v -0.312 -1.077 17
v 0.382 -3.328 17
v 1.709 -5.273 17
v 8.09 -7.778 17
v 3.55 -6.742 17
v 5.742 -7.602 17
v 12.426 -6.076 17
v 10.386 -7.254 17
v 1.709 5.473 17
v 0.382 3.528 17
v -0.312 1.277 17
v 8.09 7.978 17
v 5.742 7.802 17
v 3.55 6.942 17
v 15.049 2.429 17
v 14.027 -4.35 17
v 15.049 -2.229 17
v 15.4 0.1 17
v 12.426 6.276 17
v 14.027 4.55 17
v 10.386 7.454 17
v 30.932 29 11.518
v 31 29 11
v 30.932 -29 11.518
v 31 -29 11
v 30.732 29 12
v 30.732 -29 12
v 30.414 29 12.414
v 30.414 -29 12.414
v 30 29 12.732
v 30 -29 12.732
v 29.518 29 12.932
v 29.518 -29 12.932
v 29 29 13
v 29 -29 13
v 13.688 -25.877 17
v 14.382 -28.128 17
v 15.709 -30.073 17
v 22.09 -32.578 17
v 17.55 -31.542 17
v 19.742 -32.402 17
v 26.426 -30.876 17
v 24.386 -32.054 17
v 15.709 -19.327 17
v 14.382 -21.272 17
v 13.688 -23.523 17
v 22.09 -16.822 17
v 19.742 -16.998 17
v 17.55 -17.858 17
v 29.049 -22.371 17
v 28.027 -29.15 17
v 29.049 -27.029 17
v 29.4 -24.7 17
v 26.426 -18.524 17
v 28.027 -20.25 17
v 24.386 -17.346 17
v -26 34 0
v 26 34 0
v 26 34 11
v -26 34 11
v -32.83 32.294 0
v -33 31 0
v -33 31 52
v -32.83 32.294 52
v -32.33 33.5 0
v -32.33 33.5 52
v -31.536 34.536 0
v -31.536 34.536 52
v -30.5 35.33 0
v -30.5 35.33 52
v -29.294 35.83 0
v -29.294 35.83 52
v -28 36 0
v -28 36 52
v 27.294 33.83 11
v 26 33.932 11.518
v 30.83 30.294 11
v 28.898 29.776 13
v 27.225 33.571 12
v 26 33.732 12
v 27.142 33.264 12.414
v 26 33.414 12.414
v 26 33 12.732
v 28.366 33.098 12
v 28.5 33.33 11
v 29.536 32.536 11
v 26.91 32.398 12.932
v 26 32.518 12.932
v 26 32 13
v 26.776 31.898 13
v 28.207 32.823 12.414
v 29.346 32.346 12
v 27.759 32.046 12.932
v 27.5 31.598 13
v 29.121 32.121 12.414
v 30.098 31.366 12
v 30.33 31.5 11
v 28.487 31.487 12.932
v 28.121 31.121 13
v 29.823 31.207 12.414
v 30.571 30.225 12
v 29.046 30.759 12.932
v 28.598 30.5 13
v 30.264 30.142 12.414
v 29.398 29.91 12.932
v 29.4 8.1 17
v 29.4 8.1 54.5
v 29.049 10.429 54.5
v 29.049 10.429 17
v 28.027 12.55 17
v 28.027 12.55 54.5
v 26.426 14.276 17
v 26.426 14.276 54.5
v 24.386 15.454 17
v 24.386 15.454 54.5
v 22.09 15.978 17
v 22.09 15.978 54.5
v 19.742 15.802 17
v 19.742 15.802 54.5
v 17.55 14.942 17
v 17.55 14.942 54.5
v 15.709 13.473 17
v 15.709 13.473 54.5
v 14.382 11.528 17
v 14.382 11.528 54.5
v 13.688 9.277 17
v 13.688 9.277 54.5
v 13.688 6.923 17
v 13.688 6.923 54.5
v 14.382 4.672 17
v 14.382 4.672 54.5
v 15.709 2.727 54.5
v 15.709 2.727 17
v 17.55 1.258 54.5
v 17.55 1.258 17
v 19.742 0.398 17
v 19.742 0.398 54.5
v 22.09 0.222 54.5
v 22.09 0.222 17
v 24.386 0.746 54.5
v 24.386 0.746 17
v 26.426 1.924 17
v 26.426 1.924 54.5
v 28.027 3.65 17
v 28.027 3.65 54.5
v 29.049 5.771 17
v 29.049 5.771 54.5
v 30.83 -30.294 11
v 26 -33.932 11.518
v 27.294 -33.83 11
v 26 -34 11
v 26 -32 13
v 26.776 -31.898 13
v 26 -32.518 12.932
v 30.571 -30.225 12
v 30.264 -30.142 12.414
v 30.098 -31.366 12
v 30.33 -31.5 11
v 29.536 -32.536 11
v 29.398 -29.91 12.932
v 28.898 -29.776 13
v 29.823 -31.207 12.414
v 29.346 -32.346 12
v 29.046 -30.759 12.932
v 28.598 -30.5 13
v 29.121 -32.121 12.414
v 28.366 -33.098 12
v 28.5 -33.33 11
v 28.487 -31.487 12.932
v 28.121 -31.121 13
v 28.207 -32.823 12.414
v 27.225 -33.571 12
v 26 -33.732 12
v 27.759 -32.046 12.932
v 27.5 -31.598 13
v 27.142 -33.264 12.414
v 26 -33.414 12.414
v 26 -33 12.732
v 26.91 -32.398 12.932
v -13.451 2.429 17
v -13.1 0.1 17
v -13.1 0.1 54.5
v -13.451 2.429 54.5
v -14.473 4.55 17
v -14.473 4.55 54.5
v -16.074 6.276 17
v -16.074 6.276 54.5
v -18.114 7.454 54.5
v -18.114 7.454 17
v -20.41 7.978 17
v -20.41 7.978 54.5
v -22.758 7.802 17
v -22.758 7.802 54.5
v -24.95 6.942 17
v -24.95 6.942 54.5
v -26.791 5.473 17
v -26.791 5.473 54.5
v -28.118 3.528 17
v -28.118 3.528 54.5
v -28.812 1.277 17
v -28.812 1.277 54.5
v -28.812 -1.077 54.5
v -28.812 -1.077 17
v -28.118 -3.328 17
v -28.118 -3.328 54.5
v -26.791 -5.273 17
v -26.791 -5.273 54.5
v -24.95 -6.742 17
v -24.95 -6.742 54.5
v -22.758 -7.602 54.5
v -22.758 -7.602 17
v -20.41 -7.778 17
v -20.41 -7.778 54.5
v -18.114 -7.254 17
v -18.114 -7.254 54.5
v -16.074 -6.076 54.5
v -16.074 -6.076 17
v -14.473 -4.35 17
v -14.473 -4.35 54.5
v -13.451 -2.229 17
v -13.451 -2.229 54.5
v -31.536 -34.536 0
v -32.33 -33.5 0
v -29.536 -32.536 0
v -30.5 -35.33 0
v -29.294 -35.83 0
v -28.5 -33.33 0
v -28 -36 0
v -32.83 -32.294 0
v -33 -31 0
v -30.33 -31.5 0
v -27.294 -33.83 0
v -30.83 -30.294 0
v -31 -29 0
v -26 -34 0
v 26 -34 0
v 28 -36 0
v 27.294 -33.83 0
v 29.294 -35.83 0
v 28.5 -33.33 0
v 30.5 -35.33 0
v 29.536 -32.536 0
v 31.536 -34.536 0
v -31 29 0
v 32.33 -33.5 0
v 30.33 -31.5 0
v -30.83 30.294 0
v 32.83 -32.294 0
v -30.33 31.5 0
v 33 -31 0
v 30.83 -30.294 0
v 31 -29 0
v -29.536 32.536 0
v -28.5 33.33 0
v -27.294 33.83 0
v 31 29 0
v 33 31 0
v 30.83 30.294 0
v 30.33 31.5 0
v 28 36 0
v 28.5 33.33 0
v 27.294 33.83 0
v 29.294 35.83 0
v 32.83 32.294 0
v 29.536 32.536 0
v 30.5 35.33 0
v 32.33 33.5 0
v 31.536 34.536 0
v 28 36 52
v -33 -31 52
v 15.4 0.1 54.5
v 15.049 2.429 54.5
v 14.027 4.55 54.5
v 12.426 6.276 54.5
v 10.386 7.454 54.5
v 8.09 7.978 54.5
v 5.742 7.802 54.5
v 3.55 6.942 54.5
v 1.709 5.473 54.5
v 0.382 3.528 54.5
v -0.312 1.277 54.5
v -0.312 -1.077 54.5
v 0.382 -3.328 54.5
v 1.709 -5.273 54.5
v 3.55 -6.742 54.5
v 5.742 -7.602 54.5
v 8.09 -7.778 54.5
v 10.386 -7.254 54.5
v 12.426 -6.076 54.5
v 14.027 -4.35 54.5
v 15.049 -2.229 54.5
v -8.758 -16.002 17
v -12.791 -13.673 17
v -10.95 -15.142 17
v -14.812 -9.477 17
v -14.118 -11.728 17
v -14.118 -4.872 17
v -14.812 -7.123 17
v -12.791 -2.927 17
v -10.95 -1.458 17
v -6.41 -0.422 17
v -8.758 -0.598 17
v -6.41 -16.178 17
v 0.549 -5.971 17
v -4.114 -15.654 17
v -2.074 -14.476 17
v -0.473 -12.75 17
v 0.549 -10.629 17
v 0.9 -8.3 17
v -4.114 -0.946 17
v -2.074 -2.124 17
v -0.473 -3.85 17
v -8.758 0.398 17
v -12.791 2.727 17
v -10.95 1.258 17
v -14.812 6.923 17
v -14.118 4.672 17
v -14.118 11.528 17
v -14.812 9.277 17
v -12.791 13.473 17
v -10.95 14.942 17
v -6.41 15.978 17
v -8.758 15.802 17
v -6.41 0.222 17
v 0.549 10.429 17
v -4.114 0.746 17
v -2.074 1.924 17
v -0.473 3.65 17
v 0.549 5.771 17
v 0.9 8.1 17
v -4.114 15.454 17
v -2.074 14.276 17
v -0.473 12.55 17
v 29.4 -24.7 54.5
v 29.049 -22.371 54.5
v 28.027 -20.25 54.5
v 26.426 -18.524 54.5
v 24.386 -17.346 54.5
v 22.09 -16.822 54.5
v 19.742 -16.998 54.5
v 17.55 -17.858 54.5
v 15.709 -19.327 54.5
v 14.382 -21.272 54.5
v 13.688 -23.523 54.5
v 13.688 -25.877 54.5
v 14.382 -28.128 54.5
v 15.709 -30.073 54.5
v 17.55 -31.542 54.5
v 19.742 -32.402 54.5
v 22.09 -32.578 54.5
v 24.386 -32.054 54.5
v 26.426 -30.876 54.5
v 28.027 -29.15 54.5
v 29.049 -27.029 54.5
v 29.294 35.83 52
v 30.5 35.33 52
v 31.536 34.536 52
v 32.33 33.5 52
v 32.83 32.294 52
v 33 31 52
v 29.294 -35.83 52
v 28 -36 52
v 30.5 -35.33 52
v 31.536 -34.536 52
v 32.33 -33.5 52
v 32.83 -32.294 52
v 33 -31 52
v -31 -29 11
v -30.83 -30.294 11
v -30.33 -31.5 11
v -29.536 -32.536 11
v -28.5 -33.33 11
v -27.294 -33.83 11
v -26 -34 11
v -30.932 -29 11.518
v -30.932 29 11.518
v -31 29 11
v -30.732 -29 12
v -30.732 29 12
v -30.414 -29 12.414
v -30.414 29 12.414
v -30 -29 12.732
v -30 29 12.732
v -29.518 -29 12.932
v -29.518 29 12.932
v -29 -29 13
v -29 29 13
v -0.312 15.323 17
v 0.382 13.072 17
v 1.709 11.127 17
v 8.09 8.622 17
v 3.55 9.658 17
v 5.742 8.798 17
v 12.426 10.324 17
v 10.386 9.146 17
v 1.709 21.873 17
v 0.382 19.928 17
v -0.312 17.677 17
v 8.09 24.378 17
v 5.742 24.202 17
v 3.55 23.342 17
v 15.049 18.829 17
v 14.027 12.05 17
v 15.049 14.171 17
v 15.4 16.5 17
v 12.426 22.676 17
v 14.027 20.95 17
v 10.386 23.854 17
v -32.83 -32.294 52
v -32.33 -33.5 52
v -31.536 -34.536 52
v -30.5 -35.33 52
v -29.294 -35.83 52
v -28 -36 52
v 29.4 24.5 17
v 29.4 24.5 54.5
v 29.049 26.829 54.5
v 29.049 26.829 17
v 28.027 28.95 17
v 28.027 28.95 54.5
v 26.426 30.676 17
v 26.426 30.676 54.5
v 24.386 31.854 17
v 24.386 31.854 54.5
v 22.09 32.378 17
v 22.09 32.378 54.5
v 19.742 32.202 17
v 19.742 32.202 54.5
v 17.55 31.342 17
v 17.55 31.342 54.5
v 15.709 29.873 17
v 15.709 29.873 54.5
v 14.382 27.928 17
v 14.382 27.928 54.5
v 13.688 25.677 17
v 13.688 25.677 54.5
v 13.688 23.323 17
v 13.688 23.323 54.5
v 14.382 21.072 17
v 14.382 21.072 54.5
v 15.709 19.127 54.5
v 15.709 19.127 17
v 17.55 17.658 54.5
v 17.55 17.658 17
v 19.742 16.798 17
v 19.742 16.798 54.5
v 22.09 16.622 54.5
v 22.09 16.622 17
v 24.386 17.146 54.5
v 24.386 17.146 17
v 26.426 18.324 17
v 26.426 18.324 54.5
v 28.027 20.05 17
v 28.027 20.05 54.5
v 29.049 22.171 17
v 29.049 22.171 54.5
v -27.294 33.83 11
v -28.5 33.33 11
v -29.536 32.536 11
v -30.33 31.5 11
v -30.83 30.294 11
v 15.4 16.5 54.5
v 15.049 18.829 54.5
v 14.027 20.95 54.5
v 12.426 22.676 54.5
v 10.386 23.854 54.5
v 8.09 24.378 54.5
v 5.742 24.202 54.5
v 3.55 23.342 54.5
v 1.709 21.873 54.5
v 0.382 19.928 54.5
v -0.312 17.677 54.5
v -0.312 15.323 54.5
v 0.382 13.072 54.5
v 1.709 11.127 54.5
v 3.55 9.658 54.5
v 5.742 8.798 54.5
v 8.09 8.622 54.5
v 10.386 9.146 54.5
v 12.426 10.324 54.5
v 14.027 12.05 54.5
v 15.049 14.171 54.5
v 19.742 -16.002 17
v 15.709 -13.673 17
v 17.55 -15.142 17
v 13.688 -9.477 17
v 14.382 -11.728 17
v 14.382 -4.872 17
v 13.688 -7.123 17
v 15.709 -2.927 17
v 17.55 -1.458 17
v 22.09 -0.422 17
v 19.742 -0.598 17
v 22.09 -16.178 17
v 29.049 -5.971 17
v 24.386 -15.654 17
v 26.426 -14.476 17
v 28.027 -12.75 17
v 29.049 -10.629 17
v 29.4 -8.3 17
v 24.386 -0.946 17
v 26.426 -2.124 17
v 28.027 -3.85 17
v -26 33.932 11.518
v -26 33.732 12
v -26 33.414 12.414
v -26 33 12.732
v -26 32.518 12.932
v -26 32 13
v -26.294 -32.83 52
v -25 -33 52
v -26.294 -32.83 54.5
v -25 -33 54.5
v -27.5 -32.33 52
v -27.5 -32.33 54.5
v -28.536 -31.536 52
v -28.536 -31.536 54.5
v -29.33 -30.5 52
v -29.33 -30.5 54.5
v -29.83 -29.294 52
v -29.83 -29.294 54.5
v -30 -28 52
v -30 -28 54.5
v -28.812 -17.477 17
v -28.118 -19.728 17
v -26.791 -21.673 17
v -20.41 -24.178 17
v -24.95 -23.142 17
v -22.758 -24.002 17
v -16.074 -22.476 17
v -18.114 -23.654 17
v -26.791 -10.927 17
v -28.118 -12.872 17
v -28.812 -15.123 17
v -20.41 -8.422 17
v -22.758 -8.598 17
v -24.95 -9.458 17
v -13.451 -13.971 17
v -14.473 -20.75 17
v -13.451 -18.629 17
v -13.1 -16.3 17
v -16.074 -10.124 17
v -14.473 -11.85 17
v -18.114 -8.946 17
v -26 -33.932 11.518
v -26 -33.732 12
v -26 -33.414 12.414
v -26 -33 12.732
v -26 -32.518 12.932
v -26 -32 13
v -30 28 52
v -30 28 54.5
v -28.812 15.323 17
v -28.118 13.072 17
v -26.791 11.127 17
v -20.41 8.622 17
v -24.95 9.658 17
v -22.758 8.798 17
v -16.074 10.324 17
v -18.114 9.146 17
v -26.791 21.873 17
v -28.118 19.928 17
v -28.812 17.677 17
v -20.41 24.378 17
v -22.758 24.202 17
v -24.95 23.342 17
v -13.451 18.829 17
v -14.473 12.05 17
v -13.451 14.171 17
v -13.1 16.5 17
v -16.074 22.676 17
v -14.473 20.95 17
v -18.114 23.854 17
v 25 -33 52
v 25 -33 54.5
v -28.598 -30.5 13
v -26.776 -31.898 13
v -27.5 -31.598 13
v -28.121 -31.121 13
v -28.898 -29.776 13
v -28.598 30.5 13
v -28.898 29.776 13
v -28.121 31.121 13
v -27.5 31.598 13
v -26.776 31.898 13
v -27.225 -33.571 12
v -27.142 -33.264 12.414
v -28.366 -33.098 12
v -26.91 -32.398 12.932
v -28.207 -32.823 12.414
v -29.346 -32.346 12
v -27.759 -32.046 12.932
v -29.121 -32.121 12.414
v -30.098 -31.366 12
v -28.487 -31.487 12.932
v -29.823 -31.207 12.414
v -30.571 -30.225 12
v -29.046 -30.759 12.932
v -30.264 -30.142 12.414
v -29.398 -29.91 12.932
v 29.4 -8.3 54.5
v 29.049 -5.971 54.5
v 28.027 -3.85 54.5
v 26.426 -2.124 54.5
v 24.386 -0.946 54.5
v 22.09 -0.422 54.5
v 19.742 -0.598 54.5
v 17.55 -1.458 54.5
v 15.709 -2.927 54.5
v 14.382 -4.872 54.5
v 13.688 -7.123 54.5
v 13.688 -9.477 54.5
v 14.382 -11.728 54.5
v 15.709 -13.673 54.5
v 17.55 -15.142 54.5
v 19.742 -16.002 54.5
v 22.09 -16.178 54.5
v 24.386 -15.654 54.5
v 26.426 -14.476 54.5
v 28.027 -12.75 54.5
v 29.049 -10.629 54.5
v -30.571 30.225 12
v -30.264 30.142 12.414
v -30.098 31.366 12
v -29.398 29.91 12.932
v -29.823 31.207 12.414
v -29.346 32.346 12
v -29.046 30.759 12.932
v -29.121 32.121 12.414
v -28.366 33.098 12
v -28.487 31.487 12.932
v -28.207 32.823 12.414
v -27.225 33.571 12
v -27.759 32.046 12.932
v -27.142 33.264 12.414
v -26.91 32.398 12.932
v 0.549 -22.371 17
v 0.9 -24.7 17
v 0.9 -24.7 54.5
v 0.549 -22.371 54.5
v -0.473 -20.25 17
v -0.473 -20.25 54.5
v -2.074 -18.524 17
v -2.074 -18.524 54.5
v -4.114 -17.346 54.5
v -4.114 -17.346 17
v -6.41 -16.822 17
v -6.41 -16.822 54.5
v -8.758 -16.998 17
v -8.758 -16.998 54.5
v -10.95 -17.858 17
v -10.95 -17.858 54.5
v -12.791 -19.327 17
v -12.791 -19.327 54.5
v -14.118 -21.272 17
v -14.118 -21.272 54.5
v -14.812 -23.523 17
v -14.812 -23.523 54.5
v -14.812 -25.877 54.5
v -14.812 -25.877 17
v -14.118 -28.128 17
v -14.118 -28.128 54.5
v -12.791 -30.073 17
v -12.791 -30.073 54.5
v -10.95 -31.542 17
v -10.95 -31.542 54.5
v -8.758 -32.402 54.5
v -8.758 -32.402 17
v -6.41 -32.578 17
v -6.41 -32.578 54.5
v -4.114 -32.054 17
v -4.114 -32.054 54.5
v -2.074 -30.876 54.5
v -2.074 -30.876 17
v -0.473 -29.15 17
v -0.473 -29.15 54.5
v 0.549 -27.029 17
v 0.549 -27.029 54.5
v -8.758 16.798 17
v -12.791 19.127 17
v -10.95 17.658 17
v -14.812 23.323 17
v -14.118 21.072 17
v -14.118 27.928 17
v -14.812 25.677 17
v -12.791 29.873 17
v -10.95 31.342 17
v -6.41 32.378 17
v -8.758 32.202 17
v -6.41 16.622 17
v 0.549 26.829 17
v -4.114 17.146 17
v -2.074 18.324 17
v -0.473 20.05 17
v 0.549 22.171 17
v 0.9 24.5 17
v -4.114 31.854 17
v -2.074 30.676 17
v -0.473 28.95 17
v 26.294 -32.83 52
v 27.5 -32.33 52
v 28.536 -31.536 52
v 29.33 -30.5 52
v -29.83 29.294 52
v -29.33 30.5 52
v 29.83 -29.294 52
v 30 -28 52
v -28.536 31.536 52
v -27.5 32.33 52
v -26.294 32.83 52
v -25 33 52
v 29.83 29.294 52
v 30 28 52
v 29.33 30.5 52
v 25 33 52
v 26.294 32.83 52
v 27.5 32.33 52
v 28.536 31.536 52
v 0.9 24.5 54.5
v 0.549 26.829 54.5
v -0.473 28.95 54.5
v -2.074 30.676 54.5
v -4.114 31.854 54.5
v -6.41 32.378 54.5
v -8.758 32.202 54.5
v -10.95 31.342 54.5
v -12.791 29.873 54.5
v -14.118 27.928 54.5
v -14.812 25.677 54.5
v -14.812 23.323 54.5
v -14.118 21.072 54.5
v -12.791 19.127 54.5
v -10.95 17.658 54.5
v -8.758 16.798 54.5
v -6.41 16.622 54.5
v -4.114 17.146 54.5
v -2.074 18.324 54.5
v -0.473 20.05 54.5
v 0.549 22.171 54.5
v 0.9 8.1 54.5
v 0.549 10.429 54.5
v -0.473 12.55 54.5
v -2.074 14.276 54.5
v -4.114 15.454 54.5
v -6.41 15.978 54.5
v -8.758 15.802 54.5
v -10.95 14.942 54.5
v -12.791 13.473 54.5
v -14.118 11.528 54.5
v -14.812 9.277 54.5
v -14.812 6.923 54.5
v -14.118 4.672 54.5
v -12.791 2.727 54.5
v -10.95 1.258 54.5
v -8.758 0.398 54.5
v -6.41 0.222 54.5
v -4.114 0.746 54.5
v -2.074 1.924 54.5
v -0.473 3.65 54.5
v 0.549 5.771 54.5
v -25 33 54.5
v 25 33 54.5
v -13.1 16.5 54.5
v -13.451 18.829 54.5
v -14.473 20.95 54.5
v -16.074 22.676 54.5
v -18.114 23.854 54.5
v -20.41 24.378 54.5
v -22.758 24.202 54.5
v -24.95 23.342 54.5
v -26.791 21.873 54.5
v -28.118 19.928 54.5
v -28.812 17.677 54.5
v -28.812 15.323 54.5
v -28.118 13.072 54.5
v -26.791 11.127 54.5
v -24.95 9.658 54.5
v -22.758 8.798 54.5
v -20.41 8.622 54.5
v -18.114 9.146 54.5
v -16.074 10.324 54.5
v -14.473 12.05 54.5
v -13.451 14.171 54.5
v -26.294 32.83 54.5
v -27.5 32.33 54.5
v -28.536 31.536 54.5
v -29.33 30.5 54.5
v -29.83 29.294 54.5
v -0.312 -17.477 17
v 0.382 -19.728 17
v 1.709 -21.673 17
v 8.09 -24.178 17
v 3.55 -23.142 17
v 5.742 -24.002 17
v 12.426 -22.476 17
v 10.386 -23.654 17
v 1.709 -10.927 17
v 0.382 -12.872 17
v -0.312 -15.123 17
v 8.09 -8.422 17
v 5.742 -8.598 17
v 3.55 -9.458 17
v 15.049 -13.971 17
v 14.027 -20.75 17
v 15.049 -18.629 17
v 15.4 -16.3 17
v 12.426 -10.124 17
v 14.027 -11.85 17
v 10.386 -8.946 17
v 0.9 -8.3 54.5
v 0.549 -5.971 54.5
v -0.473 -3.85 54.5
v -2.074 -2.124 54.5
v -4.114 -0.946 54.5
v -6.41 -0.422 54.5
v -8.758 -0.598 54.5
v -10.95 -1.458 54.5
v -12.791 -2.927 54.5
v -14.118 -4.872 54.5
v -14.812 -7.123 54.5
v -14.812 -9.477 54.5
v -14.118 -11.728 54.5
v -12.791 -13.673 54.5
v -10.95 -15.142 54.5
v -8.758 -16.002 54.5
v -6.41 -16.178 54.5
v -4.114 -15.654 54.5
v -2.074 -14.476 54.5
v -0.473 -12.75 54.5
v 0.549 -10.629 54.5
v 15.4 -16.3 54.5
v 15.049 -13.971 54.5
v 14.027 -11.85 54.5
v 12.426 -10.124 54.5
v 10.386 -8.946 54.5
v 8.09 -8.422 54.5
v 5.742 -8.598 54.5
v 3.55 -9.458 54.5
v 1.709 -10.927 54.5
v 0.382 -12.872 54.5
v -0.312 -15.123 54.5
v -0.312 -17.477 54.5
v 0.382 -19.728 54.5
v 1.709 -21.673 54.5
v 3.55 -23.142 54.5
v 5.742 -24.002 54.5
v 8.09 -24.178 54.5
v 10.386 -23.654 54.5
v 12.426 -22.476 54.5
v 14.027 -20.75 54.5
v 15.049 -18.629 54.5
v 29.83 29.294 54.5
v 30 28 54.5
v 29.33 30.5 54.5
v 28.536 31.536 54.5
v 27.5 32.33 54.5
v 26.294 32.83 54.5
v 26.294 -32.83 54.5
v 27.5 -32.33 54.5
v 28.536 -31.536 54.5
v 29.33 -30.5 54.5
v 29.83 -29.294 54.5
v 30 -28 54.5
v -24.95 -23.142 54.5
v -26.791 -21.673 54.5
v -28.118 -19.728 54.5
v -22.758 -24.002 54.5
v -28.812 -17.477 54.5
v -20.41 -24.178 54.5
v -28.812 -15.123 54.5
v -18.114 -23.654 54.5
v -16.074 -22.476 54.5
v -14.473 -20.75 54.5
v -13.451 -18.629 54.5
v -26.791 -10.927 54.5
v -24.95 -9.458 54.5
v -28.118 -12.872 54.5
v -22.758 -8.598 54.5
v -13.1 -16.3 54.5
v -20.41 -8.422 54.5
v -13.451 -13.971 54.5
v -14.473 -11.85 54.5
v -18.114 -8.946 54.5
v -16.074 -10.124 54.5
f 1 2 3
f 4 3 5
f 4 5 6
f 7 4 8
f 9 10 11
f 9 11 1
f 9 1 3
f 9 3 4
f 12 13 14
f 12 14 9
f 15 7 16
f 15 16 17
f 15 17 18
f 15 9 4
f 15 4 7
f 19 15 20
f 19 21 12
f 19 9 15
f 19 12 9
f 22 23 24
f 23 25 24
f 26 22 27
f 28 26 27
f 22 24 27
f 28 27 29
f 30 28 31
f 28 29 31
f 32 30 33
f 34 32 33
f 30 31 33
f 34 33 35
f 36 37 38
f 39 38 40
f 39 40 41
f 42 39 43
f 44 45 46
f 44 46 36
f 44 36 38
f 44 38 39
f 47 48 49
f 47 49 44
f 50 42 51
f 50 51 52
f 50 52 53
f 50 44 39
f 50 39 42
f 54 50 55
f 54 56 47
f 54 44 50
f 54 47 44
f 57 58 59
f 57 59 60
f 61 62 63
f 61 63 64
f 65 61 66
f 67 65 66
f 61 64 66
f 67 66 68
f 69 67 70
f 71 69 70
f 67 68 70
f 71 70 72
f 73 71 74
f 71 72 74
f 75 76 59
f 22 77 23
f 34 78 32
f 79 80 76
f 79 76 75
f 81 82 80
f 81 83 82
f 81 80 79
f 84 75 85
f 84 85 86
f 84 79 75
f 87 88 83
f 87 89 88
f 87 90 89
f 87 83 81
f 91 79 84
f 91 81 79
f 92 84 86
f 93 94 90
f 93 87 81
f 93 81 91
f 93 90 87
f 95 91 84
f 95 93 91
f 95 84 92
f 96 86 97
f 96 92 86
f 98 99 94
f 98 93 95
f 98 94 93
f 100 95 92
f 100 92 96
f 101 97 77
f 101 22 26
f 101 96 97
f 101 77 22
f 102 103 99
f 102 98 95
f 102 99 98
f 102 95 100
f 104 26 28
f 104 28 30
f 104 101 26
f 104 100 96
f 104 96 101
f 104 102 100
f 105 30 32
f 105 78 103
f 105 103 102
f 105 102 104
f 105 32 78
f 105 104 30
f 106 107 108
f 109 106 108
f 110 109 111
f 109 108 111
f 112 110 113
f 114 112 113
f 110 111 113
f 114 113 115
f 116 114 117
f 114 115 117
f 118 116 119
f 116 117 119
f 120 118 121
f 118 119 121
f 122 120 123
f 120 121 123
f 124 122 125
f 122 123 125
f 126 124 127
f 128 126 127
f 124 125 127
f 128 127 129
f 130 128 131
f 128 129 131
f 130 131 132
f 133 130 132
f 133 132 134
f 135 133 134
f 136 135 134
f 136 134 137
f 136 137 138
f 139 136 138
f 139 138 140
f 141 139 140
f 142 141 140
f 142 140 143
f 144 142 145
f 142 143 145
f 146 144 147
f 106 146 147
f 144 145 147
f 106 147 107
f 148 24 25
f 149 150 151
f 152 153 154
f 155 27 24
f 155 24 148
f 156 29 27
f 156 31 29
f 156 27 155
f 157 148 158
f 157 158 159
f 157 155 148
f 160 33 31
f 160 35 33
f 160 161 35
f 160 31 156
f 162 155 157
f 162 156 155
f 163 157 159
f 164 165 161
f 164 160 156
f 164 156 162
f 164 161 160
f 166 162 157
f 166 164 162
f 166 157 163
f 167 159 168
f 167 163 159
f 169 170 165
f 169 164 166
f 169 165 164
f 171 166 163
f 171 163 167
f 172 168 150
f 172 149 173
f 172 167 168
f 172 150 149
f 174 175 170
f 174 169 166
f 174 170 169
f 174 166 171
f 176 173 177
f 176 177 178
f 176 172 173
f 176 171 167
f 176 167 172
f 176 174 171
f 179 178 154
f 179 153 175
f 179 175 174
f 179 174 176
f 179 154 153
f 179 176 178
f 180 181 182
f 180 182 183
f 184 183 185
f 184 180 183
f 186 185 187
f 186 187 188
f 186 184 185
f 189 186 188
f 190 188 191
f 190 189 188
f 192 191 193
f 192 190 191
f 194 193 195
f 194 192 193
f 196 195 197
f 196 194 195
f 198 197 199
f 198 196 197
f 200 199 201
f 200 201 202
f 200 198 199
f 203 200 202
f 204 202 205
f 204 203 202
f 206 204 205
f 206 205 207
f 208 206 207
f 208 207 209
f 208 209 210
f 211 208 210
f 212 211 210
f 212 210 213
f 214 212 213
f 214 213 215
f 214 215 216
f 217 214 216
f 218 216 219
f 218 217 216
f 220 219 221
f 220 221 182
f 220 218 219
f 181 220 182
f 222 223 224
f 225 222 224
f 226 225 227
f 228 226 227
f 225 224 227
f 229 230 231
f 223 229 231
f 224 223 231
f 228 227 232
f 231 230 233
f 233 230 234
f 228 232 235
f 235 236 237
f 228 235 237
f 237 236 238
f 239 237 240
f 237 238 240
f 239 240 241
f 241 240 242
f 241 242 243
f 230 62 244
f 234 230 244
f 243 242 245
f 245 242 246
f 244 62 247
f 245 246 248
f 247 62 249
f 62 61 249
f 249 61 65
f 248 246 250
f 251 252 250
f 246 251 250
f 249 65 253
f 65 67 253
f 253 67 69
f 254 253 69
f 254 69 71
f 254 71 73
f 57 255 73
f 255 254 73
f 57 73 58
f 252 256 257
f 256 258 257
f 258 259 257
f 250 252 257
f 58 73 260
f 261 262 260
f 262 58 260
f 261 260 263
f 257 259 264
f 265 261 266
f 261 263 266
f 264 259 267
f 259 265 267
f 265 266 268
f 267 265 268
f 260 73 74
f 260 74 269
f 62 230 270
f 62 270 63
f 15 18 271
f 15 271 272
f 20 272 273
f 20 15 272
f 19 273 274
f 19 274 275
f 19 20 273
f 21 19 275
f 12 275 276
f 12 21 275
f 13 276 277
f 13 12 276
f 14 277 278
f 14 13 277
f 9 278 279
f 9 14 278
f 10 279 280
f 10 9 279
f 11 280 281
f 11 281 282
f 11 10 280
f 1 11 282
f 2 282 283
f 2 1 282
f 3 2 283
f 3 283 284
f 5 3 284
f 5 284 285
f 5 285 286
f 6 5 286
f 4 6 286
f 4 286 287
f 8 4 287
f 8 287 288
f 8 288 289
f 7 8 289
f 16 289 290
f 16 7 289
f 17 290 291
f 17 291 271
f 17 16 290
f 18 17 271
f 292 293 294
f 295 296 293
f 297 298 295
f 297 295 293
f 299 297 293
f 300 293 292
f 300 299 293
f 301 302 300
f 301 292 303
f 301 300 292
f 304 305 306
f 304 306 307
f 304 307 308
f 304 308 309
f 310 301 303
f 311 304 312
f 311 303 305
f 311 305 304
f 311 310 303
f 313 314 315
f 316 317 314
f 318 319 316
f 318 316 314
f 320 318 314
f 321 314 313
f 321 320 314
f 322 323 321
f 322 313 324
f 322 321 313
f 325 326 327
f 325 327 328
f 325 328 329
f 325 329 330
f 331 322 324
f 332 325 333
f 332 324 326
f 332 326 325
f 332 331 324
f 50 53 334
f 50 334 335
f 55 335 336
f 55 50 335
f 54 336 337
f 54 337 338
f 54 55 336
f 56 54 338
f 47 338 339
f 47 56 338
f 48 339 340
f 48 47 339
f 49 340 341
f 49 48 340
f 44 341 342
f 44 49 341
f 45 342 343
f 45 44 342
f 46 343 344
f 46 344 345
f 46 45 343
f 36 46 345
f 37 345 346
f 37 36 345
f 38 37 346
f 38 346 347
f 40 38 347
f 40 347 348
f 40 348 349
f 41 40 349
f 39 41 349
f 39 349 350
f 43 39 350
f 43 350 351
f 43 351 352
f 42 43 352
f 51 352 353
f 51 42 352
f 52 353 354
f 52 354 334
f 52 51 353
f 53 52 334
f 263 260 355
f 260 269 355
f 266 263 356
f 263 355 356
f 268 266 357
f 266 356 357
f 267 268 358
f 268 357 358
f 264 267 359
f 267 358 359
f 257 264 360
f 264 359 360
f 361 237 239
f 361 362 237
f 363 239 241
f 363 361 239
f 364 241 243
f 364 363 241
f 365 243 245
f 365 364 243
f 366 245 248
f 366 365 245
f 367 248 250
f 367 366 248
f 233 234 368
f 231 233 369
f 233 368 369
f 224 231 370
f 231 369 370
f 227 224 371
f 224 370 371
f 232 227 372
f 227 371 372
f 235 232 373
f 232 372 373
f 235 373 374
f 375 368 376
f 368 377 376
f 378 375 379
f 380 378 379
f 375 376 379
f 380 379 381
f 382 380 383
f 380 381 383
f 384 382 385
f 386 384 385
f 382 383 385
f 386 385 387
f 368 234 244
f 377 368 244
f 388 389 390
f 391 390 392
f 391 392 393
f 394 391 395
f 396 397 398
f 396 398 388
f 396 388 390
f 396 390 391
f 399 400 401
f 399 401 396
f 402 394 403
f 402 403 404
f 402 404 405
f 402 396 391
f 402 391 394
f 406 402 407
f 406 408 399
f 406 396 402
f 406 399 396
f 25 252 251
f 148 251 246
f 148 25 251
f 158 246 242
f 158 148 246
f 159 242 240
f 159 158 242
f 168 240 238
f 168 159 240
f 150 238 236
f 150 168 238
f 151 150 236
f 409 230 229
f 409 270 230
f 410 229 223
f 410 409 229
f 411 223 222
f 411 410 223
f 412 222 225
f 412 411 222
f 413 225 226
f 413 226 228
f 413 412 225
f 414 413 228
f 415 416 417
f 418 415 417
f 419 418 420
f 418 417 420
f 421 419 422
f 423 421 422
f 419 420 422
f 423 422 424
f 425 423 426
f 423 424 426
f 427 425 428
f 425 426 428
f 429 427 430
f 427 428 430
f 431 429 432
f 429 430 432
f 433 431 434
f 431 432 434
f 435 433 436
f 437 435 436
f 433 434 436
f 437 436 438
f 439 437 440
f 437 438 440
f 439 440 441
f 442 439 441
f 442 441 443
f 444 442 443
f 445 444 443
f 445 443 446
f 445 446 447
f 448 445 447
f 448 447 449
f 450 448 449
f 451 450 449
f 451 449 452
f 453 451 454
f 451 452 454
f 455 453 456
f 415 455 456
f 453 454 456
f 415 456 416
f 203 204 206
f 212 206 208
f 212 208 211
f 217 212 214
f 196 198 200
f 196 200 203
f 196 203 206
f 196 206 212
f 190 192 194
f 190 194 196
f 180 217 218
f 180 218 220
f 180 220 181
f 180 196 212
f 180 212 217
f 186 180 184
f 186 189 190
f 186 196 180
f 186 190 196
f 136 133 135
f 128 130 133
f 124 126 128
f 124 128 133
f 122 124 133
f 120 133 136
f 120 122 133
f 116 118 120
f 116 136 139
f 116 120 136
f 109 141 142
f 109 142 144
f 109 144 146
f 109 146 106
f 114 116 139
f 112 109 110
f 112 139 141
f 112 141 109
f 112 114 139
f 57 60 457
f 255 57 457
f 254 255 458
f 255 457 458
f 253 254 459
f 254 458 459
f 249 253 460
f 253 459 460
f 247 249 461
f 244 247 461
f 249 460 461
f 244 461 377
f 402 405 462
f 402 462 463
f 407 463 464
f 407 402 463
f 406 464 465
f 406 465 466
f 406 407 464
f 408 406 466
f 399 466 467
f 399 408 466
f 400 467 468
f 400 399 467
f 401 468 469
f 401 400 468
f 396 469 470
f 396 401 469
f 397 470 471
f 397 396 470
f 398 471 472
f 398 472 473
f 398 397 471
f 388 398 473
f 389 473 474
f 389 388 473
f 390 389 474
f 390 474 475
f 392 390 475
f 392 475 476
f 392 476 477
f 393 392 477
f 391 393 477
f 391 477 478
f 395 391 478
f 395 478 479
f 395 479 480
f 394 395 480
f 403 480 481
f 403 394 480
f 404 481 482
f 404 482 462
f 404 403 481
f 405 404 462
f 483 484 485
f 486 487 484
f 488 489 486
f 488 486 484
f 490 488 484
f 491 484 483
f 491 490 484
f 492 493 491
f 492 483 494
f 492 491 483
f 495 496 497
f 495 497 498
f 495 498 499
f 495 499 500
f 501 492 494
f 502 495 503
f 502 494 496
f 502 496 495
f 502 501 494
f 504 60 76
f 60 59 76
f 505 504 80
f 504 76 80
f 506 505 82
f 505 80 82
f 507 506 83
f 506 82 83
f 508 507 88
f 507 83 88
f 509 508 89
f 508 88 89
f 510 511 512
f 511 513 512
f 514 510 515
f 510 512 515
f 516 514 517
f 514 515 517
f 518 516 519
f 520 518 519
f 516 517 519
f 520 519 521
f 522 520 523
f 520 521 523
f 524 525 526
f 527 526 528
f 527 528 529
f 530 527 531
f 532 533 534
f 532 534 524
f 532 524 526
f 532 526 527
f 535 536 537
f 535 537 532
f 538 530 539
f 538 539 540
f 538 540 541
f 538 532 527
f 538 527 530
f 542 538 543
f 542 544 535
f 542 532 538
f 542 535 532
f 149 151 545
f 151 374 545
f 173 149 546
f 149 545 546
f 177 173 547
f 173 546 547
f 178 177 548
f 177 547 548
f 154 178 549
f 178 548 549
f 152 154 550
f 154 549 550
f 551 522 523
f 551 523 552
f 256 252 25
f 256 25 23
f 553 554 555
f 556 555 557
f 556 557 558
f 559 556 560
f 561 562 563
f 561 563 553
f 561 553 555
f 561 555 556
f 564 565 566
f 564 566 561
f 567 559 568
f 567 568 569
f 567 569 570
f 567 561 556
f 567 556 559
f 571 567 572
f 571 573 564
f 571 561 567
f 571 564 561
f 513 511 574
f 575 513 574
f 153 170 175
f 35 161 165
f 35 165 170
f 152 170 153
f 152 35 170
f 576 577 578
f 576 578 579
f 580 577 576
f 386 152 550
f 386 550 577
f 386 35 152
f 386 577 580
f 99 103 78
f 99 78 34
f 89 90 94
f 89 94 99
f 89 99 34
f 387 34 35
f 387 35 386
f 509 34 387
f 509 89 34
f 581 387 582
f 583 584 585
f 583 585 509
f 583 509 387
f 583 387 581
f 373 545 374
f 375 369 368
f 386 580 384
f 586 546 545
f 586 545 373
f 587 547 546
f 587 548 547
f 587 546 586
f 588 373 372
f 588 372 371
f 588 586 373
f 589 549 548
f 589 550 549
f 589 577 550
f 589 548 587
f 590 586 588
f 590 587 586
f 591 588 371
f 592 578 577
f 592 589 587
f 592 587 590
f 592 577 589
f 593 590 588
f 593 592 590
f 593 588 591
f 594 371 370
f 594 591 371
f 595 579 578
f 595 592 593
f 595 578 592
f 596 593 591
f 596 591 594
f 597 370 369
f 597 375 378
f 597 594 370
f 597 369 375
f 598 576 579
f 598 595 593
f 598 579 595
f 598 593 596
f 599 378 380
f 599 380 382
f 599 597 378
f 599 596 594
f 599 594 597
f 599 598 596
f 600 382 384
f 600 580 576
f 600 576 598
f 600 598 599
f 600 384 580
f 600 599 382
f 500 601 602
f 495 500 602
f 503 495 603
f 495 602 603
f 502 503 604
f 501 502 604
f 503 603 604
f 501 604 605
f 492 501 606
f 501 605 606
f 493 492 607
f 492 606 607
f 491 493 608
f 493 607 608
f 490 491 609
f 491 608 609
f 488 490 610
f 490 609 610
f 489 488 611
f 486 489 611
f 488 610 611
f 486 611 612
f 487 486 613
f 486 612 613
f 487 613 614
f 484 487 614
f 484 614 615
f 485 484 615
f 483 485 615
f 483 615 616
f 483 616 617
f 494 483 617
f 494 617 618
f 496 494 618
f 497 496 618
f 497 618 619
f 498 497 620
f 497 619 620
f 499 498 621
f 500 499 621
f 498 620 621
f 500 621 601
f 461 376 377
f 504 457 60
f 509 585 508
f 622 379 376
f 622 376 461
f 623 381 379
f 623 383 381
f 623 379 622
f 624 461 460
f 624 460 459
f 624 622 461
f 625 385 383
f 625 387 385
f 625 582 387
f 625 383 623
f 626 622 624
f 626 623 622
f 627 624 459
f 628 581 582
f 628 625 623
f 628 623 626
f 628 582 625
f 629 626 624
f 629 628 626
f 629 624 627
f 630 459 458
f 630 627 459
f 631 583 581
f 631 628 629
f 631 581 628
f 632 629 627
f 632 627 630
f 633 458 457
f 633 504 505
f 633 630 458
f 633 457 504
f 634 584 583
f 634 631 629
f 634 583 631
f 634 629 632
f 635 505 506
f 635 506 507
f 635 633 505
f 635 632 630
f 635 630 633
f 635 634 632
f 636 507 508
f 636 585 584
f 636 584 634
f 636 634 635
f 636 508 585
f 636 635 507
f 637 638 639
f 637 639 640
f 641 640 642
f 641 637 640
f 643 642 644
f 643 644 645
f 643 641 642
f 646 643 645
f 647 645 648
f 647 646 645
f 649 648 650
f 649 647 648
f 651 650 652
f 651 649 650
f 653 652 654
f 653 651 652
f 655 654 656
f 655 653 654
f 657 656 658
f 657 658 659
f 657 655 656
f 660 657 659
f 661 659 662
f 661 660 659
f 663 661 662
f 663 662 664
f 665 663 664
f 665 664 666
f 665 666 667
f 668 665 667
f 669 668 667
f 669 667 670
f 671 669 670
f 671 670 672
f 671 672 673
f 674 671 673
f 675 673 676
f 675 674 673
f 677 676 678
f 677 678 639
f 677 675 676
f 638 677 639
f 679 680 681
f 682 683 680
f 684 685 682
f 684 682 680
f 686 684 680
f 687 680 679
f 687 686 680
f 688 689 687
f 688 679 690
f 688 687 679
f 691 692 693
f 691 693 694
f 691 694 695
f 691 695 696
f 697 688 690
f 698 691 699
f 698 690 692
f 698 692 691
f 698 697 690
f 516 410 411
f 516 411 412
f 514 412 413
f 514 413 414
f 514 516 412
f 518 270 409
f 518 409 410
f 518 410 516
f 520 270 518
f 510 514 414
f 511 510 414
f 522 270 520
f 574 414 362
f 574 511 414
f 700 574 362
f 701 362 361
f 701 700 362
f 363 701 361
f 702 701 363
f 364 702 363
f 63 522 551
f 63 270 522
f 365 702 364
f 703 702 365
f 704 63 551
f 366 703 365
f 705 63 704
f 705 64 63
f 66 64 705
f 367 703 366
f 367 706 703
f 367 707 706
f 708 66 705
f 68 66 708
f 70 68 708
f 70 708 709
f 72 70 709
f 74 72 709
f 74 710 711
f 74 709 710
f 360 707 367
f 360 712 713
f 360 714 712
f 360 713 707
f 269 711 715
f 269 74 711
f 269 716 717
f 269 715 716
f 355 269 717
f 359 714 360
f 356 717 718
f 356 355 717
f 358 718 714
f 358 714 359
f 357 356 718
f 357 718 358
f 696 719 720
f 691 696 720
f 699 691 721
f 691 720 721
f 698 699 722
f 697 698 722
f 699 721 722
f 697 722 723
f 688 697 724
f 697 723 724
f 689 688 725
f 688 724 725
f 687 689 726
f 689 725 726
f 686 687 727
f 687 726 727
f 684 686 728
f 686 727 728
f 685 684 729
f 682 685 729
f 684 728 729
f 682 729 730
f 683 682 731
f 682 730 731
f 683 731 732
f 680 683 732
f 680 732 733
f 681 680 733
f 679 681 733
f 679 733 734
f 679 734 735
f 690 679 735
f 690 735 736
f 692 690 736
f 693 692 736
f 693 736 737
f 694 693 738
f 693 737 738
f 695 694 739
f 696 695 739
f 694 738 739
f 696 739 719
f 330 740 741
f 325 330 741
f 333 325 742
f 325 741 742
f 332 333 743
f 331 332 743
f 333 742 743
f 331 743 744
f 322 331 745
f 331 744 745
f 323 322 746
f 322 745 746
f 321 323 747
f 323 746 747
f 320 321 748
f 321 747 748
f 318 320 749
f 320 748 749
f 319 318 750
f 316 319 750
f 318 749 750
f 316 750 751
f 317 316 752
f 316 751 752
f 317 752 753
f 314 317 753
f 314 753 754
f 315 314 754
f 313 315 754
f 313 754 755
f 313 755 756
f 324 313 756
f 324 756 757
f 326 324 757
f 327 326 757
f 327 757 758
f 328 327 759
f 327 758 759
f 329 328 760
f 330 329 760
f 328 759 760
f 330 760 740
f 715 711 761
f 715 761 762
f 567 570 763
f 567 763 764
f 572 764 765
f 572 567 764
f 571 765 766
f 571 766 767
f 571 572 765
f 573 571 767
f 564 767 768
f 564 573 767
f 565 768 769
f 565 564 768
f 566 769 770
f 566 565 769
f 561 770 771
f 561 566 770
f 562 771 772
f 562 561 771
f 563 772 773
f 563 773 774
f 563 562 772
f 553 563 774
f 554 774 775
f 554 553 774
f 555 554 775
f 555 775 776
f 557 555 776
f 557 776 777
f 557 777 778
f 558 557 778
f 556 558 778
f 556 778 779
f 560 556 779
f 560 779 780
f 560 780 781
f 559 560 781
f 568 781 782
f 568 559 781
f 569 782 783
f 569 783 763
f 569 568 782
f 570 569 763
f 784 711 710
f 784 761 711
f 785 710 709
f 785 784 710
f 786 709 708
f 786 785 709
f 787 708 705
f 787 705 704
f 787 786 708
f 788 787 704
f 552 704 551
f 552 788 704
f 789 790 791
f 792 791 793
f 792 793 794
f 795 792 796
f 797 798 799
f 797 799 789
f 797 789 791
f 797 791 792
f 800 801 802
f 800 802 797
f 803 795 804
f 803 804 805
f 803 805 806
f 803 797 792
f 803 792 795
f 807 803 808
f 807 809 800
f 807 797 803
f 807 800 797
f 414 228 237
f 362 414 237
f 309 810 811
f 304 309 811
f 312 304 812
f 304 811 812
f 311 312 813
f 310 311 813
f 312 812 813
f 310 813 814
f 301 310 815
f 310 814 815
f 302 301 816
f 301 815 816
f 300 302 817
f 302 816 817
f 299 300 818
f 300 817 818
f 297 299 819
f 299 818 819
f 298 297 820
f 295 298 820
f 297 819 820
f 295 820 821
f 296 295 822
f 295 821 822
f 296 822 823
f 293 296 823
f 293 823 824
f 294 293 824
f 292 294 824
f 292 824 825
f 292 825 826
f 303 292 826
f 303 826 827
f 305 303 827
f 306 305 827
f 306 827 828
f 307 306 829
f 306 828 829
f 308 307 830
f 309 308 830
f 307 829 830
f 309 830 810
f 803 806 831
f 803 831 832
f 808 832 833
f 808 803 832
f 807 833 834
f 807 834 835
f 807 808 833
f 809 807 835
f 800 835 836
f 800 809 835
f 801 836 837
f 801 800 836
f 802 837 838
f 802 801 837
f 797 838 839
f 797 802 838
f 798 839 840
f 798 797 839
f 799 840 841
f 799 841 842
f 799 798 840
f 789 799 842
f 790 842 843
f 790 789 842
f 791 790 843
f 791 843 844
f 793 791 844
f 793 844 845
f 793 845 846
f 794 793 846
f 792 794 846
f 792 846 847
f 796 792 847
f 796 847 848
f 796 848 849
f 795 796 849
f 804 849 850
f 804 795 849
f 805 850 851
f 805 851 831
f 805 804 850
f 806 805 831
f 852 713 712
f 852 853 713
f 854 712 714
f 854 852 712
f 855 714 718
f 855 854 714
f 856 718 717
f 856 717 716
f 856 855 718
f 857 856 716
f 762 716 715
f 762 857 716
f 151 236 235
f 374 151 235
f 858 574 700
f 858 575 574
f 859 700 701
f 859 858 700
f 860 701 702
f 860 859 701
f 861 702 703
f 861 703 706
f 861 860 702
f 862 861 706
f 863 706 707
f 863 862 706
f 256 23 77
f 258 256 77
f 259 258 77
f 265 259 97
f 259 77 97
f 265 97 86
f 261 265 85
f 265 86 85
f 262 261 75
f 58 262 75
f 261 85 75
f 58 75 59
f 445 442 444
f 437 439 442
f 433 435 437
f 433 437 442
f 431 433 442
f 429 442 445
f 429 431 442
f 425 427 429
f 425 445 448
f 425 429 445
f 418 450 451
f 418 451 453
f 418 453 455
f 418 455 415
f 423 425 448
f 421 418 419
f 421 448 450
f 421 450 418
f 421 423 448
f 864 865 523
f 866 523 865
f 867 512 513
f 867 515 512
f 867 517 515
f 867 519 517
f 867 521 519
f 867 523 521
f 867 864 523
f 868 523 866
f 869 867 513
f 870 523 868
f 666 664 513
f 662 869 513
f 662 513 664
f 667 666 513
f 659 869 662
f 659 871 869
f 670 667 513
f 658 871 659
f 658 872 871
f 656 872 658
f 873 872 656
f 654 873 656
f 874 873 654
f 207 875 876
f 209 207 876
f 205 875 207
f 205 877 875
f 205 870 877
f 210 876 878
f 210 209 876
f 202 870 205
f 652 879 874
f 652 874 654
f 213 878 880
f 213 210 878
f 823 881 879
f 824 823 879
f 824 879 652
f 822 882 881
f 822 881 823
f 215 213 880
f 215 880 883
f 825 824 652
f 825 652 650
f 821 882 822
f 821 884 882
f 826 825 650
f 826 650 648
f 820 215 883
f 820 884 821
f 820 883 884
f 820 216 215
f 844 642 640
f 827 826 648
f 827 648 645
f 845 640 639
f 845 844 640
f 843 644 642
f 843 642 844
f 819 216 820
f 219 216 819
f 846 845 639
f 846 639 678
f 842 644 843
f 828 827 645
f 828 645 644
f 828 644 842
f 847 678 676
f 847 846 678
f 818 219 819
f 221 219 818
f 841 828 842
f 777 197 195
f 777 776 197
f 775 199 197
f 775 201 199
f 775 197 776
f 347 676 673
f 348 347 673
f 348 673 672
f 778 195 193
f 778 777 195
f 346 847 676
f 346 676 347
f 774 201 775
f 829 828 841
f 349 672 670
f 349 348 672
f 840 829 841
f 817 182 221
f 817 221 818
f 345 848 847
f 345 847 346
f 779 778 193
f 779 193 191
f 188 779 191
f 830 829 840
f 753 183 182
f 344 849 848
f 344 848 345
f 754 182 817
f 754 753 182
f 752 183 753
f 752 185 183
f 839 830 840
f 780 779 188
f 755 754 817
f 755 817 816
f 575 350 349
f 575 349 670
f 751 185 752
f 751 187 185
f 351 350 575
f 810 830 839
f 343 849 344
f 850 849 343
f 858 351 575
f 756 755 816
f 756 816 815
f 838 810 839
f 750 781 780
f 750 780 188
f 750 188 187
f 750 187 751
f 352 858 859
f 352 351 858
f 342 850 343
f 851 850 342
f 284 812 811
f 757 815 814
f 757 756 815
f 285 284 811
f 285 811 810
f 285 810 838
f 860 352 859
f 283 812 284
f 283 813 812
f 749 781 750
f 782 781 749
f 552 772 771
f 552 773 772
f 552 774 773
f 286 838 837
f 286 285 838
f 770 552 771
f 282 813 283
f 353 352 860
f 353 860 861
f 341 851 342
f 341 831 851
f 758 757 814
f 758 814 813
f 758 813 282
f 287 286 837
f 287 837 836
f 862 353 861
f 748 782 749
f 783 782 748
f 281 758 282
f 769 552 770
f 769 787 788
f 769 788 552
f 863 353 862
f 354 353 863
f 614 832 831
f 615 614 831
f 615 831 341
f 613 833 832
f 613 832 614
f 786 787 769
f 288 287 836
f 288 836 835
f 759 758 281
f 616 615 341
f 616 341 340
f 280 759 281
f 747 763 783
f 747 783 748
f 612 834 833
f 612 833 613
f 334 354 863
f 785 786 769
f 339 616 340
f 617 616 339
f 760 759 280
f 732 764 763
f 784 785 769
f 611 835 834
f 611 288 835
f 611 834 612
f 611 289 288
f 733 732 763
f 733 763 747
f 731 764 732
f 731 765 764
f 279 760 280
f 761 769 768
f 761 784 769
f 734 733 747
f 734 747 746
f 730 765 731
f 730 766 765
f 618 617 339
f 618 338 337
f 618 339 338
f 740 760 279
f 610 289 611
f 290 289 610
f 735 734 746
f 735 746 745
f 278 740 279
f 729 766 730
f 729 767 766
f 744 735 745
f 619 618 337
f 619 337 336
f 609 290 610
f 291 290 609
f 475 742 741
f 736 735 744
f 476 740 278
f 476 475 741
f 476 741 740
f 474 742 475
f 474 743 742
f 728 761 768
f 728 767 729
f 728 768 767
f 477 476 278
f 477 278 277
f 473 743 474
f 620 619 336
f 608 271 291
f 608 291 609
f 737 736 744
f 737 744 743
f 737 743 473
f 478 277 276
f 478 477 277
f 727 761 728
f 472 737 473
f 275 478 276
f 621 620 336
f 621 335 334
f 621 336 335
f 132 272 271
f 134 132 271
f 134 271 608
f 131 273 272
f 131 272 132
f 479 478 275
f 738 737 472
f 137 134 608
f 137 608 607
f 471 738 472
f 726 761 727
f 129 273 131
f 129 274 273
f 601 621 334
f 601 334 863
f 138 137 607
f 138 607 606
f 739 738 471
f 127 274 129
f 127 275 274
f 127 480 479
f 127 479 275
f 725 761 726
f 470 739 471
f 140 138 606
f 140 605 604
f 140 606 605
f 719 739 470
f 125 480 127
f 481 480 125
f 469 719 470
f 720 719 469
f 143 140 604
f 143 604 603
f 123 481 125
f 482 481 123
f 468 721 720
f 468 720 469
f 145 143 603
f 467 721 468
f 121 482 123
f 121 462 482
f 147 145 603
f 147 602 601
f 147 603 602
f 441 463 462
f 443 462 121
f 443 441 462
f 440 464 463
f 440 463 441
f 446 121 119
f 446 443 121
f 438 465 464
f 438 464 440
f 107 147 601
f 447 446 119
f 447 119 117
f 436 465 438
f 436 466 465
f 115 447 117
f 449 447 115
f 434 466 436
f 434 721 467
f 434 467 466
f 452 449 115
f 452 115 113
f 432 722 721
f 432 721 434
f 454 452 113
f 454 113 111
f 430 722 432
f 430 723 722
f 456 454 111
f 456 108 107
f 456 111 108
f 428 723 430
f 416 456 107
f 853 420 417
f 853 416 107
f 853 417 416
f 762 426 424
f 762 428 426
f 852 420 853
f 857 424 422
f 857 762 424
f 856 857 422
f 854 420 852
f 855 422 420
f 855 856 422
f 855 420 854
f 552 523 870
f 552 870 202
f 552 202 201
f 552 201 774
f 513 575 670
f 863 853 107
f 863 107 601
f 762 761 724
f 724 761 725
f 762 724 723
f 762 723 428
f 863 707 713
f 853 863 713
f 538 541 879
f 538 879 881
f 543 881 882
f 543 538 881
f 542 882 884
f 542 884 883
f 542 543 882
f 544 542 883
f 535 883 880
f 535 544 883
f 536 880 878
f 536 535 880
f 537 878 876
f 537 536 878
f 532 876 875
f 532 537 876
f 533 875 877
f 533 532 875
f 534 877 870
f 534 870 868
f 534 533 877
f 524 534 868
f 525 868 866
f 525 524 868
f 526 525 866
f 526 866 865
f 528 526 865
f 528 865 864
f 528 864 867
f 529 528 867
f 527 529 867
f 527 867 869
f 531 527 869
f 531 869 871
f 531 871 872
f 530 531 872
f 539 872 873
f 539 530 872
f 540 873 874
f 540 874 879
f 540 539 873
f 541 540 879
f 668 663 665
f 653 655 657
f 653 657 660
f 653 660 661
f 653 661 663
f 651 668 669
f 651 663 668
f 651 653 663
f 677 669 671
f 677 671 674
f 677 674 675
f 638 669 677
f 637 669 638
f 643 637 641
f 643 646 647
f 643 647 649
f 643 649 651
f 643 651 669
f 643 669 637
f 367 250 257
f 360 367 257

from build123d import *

# Parameters (mm, degrees)
SKETCH1_W                 = 66
SKETCH1_H                 = 72
BOSS_EXTRUDE1_DEPTH       = 52
SKETCH2_W                 = 60
SKETCH2_H                 = 66
BOSS_EXTRUDE2_DEPTH       = 2.5
SKETCH3_W                 = 62
SKETCH3_H                 = 68
CUT_EXTRUDE1_DEPTH        = 13
SKETCH4_R                 = 7.9
CUT_EXTRUDE2_DEPTH        = 37.5
LPATTERN1_COUNT           = 3
LPATTERN1_PITCH           = 16.4
LPATTERN1_COUNT_DIR2      = 2
LPATTERN1_PITCH_DIR2      = 28.5
SKETCH_PATTERN1_START     = 17
SKETCH_PATTERN1_OUTLINE_R = 7.9
SKETCH_PATTERN1_DEPTH     = 37.5
FILLET1_R                 = 5
FILLET2_R                 = 2


# Read off the part's stored shape, not the designer's step: Sketch-Pattern1
with BuildPart() as part:
    # Sketch1 → Boss-Extrude1 (new body)
    with BuildSketch(Plane.XY):
        Rectangle(SKETCH1_W, SKETCH1_H)
    extrude(amount=BOSS_EXTRUDE1_DEPTH)

    # Sketch2 → Boss-Extrude2 (add)
    with BuildSketch(Plane.XY.offset(52)):
        Rectangle(SKETCH2_W, SKETCH2_H)
    extrude(amount=BOSS_EXTRUDE2_DEPTH)

    # Sketch3 → Cut-Extrude1 (cut)
    with BuildSketch(Plane(origin=(0, 0, 0), x_dir=(-1, 0, 0), z_dir=(0, 0, -1))):
        Rectangle(SKETCH3_W, SKETCH3_H)
    extrude(amount=-CUT_EXTRUDE1_DEPTH, mode=Mode.SUBTRACT)

    # Sketch4 → Cut-Extrude2 (cut)
    with BuildSketch(Plane.XY.offset(54.5)):
        with Locations((21.5, 24.5)):
            Circle(SKETCH4_R)
    cut_extrude2 = extrude(amount=-CUT_EXTRUDE2_DEPTH, mode=Mode.SUBTRACT)

    # LPattern1: Cut-Extrude2 3 × 2
    with Locations(*[(-j * LPATTERN1_PITCH_DIR2, -i * LPATTERN1_PITCH, 0) for i in range(LPATTERN1_COUNT) for j in range(LPATTERN1_COUNT_DIR2) if (i, j) != (0, 0)]):
        add(cut_extrude2, mode=Mode.SUBTRACT)

    # Sketch-Pattern1 outline → Sketch-Pattern1 (cut)
    with BuildSketch(Plane.XY.offset(SKETCH_PATTERN1_START)):
        with Locations((7.5, 16.5)):
            Circle(SKETCH_PATTERN1_OUTLINE_R)
        with Locations((-21, -16.3)):
            Circle(SKETCH_PATTERN1_OUTLINE_R)
        with Locations((-21, 16.5)):
            Circle(SKETCH_PATTERN1_OUTLINE_R)
        with Locations((7.5, 0.1)):
            Circle(SKETCH_PATTERN1_OUTLINE_R)
        with Locations((-21, 0.1)):
            Circle(SKETCH_PATTERN1_OUTLINE_R)
        with Locations((7.5, -16.3)):
            Circle(SKETCH_PATTERN1_OUTLINE_R)
        with Locations((-7, -24.7)):
            Circle(SKETCH_PATTERN1_OUTLINE_R)
        with Locations((21.5, -24.7)):
            Circle(SKETCH_PATTERN1_OUTLINE_R)
    extrude(amount=SKETCH_PATTERN1_DEPTH, mode=Mode.SUBTRACT)

    # Fillet1
    fillet1_edges = [part.edges().sort_by_distance(p)[0] for p in [
        (30, 33, 53.25),
        (-30, 33, 53.25),
        (-30, -33, 53.25),
        (30, -33, 53.25),
        (-31, -34, 6.5),
        (31, -34, 6.5),
        (31, 34, 6.5),
        (-31, 34, 6.5),
        (-33, 36, 26),
        (33, 36, 26),
        (33, -36, 26),
        (-33, -36, 26),
    ]]
    fillet(fillet1_edges, radius=FILLET1_R)

    # Fillet2
    fillet2_edges = [part.edges().sort_by_distance(p)[0] for p in [
        (0, -34, 13),
        (31, 0, 13),
        (-31, 0, 13),
        (0, 34, 13),
        (-29.535533906, 32.535533906, 13),
        (-29.535533906, -32.535533906, 13),
        (29.535533906, 32.535533906, 13),
        (29.535533906, -32.535533906, 13),
    ]]
    fillet(fillet2_edges, radius=FILLET2_R)


solid = part.part
